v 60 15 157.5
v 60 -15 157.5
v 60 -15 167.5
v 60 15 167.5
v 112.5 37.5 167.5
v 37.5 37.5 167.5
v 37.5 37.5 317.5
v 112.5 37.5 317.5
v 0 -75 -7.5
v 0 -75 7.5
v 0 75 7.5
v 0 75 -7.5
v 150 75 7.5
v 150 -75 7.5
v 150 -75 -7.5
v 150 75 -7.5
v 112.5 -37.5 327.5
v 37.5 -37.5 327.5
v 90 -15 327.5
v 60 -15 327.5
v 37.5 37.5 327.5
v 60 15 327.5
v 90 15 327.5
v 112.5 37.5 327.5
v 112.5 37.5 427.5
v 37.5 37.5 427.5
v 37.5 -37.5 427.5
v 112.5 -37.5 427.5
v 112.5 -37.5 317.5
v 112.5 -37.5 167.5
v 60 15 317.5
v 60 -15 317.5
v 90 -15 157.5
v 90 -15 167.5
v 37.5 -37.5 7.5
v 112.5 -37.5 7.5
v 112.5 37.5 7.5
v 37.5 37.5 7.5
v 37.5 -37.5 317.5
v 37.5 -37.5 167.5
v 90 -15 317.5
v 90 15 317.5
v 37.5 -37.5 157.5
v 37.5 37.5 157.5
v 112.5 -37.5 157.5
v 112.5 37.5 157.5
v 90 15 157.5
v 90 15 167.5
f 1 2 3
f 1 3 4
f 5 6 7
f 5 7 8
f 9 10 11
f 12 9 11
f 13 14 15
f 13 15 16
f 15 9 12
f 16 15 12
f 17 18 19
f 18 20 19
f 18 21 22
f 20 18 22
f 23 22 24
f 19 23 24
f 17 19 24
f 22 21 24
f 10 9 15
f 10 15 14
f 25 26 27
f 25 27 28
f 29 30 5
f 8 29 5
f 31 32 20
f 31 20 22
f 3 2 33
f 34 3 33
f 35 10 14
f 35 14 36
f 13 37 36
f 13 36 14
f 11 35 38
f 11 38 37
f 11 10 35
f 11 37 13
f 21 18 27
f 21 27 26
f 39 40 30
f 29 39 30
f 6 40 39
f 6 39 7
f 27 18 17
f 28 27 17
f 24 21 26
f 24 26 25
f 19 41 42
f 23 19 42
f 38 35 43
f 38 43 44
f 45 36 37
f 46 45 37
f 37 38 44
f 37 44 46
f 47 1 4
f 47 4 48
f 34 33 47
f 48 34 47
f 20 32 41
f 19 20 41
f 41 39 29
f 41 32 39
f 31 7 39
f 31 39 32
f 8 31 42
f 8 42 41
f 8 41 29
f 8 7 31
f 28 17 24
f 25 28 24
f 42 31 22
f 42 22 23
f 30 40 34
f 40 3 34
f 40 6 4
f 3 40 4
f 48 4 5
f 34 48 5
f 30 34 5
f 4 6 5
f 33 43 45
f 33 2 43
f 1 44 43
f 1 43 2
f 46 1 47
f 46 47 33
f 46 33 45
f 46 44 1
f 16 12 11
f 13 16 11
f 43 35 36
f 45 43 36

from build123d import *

# Parameters (mm, degrees)
SKETCH1_W           = 150
SKETCH1_H           = 15
BOSS_EXTRUDE1_DEPTH = 150
SKETCH2_W           = 75
SKETCH2_H           = 75
BOSS_EXTRUDE2_DEPTH = 150
SKETCH3_W           = 30
SKETCH3_H           = 30
BOSS_EXTRUDE3_DEPTH = 10
SKETCH4_W           = 75
SKETCH4_H           = 75
BOSS_EXTRUDE4_DEPTH = 150
LPATTERN1_COUNT     = 2
LPATTERN1_PITCH     = 160
SKETCH5_W           = 75
SKETCH5_H           = 75
BOSS_EXTRUDE5_DEPTH = 100


with BuildPart() as part:
    # Sketch1 → Boss-Extrude1 (new body)
    with BuildSketch(Plane.YZ):
        Rectangle(SKETCH1_W, SKETCH1_H)
    extrude(amount=BOSS_EXTRUDE1_DEPTH)

    # Sketch2 → Boss-Extrude2 (add)
    with BuildSketch(Plane.XY.offset(7.5)):
        with Locations((75, 0)):
            Rectangle(SKETCH2_W, SKETCH2_H)
    extrude(amount=BOSS_EXTRUDE2_DEPTH)

    # Sketch3 → Boss-Extrude3 (add)
    with BuildSketch(Plane.XY.offset(157.5)):
        with Locations((75, 0)):
            Rectangle(SKETCH3_W, SKETCH3_H)
    boss_extrude3 = extrude(amount=BOSS_EXTRUDE3_DEPTH)

    # Sketch4 → Boss-Extrude4 (add)
    with BuildSketch(Plane.XY.offset(167.5)):
        with Locations((75, 0)):
            Rectangle(SKETCH4_W, SKETCH4_H)
    extrude(amount=BOSS_EXTRUDE4_DEPTH)

    # LPattern1: Boss-Extrude3 ×2
    with Locations(*[(0, 0, i * LPATTERN1_PITCH) for i in range(1, LPATTERN1_COUNT)]):
        add(boss_extrude3)

    # Sketch5 → Boss-Extrude5 (add)
    with BuildSketch(Plane.XY.offset(327.5)):
        with Locations((75, 0)):
            Rectangle(SKETCH5_W, SKETCH5_H)
    extrude(amount=BOSS_EXTRUDE5_DEPTH)


solid = part.part
